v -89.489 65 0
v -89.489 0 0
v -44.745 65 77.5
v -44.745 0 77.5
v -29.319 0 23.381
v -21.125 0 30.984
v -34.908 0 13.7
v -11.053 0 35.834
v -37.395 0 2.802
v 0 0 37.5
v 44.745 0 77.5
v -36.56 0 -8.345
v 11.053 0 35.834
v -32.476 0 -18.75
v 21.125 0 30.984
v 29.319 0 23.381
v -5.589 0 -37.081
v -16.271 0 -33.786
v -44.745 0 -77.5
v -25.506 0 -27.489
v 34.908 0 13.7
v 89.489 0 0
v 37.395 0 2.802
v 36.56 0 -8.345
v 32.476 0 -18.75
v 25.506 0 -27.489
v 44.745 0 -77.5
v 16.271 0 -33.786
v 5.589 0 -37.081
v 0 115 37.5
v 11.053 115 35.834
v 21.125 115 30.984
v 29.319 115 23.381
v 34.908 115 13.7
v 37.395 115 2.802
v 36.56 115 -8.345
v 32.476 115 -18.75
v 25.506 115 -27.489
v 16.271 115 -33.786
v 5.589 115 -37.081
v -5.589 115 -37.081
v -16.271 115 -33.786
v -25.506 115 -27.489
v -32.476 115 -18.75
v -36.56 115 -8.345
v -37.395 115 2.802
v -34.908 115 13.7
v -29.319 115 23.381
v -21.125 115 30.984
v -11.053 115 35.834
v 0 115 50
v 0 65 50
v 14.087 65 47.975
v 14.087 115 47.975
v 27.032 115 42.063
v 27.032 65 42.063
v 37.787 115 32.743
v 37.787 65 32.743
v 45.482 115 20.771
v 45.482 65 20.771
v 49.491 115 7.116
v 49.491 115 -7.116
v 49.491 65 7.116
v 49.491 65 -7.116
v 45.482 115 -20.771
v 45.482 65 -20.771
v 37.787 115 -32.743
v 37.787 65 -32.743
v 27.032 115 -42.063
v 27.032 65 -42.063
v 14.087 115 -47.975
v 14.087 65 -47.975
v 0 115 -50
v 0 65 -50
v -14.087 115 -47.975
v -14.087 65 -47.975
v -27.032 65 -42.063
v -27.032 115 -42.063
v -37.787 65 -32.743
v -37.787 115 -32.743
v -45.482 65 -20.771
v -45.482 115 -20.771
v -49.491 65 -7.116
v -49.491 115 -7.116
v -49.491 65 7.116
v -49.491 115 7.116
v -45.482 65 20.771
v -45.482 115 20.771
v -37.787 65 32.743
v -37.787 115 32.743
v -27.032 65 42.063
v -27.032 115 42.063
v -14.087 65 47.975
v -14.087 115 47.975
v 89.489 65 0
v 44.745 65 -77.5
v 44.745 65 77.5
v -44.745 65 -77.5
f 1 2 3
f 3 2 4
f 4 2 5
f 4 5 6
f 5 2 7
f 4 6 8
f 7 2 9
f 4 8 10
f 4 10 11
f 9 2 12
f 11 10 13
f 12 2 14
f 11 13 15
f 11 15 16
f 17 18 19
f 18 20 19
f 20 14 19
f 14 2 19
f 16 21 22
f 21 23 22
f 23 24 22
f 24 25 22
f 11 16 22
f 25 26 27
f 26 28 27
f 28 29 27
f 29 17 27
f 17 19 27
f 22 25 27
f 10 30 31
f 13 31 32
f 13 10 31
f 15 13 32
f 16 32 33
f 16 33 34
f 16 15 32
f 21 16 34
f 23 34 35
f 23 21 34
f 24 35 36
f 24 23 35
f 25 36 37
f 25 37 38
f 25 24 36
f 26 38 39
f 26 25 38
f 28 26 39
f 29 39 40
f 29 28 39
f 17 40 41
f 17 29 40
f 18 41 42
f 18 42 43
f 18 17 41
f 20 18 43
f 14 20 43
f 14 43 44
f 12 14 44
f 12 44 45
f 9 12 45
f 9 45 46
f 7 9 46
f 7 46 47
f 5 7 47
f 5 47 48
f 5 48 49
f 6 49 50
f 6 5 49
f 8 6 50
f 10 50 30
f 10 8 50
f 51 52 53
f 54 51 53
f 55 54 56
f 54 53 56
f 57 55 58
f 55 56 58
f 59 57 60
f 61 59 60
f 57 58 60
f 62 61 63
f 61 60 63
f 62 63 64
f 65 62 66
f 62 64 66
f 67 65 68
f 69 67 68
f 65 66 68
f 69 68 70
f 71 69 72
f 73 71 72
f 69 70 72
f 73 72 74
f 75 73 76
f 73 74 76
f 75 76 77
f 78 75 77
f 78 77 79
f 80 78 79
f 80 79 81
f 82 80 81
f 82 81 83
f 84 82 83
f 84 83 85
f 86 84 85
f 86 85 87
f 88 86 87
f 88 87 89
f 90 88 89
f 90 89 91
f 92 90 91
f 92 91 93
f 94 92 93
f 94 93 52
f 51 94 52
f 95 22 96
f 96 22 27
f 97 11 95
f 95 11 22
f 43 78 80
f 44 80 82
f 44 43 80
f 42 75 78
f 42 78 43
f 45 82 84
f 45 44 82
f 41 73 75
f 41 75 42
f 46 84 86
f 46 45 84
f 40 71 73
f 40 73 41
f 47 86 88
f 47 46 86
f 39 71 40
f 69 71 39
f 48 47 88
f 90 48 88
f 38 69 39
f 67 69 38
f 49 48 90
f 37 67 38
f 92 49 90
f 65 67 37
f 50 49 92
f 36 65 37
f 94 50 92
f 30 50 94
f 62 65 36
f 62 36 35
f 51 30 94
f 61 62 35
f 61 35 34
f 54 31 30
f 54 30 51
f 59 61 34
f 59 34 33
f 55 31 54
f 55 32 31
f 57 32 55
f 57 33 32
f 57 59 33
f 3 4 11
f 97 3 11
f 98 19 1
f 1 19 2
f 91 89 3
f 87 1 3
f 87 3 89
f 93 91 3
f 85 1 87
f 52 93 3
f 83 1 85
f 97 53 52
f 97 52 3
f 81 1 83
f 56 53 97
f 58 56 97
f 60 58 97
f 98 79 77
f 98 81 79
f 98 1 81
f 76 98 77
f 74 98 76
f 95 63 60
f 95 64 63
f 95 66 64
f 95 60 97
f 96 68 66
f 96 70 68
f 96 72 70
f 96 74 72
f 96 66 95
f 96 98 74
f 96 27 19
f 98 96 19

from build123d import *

# Parameters (mm, degrees)
SKETCH1_R           = 50
BOSS_EXTRUDE1_DEPTH = 65
SKETCH1_3_R         = 50
BOSS_EXTRUDE2_DEPTH = 115
SKETCH1_4_R         = 37.5
CUT_EXTRUDE1_DEPTH  = 115


with BuildPart() as part:
    # Sketch1 → Boss-Extrude1 (new body)
    with BuildSketch(Plane(origin=(0, 0, 0), x_dir=(1, 0, 0), z_dir=(0, 1, 0))):
        Polygon((44.744645862, -77.5), (89.489291724, 0), (44.744645862, 77.5), (-44.744645862, 77.5), (-89.489291724, 0), (-44.744645862, -77.5), align=None)
        Circle(SKETCH1_R, mode=Mode.SUBTRACT)
    extrude(amount=BOSS_EXTRUDE1_DEPTH)

    # Sketch1<3> → Boss-Extrude2 (add)
    with BuildSketch(Plane(origin=(0, 0, 0), x_dir=(1, 0, 0), z_dir=(0, 1, 0))):
        Circle(SKETCH1_3_R)
    extrude(amount=BOSS_EXTRUDE2_DEPTH)

    # Sketch1<4> → Cut-Extrude1 (cut)
    with BuildSketch(Plane(origin=(0, 0, 0), x_dir=(1, 0, 0), z_dir=(0, 1, 0))):
        Circle(SKETCH1_4_R)
    extrude(amount=CUT_EXTRUDE1_DEPTH, mode=Mode.SUBTRACT)


solid = part.part
